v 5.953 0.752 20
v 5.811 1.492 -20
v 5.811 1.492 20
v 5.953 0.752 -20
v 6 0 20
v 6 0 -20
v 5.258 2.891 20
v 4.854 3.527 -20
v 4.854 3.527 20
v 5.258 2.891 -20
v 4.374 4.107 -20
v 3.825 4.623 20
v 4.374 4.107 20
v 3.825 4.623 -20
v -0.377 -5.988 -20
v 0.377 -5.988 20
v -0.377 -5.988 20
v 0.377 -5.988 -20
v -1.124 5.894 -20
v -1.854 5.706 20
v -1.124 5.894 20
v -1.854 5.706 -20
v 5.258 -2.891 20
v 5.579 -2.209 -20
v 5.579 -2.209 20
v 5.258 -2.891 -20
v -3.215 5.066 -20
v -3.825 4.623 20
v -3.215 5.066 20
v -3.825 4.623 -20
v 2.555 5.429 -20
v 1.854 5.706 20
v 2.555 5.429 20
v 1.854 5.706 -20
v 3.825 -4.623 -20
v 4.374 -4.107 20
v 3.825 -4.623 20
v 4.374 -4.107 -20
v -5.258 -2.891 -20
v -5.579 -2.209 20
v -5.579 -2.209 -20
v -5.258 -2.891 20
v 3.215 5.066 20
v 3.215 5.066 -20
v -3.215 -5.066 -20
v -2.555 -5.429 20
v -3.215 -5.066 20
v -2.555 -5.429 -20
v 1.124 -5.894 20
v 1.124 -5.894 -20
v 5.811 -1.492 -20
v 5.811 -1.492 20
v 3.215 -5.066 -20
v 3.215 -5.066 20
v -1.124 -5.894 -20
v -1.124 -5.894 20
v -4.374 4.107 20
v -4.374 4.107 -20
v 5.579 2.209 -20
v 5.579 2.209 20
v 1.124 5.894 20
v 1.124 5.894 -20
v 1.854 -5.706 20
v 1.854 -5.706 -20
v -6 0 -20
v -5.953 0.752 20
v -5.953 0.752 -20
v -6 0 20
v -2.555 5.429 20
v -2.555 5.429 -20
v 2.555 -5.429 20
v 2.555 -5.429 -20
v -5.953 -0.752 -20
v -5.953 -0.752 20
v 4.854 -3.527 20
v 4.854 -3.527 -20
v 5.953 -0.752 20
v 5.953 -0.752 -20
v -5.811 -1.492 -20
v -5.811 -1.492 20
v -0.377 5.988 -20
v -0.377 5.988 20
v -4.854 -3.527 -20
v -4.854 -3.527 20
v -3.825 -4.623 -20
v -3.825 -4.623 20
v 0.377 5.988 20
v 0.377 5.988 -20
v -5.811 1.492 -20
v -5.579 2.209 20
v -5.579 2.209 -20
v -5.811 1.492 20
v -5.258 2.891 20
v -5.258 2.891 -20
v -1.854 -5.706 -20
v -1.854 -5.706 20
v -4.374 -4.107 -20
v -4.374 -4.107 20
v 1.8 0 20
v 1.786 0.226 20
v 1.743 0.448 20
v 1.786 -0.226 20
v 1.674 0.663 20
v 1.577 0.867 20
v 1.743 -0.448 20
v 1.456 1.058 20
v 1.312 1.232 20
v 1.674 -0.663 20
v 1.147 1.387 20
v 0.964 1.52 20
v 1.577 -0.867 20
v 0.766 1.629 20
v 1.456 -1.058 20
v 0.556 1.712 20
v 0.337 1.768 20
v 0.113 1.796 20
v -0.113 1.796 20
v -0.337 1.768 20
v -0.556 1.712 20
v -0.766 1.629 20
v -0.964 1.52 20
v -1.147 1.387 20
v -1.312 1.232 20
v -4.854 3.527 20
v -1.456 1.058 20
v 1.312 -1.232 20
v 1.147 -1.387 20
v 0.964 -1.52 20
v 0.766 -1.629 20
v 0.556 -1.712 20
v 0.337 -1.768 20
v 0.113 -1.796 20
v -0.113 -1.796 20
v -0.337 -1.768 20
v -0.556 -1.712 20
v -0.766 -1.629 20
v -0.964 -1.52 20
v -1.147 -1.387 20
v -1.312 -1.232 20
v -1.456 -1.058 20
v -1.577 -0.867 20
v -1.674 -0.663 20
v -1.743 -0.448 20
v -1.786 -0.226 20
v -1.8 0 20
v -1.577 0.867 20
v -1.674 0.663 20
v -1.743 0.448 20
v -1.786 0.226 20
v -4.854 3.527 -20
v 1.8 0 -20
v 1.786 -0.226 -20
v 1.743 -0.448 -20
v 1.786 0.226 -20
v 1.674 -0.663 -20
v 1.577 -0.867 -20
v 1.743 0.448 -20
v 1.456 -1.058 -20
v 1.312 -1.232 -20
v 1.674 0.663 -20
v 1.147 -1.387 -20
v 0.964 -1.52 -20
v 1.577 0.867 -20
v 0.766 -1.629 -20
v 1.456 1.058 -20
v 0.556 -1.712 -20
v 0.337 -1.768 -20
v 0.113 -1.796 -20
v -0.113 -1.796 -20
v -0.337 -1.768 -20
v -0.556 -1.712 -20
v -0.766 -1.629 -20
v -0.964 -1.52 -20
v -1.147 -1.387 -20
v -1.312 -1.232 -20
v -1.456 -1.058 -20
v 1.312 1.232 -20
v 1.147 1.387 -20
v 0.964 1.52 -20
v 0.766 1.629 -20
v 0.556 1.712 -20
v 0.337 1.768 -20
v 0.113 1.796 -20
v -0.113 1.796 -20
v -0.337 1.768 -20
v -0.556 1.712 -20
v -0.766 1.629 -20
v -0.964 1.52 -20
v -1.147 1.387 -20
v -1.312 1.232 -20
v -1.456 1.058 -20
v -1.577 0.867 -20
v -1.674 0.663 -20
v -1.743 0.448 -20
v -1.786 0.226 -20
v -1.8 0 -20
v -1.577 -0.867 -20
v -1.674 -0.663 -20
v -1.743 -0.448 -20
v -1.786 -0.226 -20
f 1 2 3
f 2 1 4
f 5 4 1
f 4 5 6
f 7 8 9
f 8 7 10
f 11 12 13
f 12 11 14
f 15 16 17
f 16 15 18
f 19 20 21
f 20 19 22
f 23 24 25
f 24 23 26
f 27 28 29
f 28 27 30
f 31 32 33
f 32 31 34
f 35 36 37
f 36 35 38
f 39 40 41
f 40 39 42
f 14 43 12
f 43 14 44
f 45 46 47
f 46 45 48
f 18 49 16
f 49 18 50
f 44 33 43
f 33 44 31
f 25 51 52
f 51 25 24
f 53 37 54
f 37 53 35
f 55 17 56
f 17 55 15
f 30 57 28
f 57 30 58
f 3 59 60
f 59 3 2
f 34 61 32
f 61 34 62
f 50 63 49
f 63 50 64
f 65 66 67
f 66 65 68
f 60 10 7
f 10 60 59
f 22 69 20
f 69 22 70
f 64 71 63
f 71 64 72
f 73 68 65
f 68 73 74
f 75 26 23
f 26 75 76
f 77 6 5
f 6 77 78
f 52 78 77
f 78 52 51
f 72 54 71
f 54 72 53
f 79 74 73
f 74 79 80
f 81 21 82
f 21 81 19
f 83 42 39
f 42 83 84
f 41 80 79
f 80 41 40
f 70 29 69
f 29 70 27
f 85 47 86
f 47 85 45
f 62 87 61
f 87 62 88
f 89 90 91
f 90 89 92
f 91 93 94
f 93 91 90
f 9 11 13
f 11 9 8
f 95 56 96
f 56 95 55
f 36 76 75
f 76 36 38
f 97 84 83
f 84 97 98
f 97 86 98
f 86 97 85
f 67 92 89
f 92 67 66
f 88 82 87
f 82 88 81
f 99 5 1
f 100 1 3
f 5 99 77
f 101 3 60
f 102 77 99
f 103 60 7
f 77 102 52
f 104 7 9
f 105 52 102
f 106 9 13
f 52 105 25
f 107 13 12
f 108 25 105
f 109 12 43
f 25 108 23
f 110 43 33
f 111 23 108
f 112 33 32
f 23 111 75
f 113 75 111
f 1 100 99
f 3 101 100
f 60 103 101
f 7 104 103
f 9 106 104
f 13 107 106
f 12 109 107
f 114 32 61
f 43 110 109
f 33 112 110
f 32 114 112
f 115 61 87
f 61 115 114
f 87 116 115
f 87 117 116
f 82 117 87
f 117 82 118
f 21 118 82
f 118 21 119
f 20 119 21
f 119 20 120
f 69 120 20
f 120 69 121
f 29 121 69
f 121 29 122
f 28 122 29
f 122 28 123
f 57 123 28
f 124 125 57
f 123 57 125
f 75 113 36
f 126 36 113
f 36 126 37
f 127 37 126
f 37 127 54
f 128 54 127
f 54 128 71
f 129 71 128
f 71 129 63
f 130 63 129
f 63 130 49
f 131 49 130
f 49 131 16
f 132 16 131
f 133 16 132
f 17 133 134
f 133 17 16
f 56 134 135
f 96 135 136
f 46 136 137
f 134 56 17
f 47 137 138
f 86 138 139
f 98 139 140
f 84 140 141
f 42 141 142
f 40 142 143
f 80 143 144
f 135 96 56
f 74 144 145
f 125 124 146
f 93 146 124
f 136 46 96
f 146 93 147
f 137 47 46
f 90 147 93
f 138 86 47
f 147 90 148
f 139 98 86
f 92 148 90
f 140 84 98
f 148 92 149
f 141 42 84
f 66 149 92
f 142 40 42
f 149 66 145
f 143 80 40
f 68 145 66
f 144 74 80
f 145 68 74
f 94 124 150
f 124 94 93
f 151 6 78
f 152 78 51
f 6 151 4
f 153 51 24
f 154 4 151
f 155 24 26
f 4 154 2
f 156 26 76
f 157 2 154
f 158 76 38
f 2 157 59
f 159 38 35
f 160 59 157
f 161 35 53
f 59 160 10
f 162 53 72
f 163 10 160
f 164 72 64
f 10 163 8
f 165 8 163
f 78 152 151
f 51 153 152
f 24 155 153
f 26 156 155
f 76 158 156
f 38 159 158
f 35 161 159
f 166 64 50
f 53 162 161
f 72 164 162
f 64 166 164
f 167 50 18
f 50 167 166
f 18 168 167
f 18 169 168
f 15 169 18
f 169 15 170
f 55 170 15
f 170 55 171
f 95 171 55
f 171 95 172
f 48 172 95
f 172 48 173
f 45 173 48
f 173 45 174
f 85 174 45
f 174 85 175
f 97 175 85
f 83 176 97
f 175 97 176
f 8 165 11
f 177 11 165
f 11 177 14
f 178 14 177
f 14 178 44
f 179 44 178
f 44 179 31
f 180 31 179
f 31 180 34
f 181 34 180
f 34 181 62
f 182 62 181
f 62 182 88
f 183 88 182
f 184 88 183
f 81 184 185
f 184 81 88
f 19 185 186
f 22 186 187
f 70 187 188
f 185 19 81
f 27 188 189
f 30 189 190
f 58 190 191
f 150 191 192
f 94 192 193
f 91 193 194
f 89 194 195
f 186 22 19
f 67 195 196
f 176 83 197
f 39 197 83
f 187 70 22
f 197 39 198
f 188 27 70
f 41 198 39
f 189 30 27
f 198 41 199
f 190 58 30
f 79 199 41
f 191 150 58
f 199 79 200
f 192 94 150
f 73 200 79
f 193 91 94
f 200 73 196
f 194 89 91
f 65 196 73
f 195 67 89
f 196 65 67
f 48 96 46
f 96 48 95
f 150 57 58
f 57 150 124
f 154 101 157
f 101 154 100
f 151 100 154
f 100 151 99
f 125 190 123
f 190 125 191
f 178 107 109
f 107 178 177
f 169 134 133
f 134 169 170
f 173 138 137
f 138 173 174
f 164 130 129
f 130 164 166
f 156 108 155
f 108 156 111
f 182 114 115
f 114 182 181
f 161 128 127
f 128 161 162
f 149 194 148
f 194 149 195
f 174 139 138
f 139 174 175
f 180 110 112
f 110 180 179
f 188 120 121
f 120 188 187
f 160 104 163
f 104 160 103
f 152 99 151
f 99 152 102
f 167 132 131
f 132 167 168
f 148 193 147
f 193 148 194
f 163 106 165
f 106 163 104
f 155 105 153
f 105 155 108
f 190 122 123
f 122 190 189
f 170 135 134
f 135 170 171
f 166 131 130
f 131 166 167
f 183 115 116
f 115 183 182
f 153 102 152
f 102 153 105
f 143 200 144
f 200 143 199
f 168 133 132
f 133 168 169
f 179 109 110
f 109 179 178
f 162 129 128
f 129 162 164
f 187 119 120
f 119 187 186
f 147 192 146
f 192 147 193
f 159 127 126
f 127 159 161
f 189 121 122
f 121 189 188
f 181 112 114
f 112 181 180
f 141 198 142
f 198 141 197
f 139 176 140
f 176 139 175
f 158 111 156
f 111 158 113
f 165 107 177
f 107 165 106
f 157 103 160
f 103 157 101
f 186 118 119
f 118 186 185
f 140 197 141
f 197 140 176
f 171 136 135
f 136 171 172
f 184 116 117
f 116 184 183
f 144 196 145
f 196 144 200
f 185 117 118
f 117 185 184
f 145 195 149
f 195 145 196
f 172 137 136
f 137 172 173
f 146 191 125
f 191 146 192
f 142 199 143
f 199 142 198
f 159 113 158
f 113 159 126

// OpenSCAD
$fn = 50;


difference() {
	union() {
		translate(v = [0, 0, -20.0000000000]) {
			cylinder(h = 40, r = 6.0000000000);
		}
	}
	union() {
		#translate(v = [0, 0, -100.0000000000]) {
			cylinder(h = 200, r = 1.8000000000);
		}
	}
}
